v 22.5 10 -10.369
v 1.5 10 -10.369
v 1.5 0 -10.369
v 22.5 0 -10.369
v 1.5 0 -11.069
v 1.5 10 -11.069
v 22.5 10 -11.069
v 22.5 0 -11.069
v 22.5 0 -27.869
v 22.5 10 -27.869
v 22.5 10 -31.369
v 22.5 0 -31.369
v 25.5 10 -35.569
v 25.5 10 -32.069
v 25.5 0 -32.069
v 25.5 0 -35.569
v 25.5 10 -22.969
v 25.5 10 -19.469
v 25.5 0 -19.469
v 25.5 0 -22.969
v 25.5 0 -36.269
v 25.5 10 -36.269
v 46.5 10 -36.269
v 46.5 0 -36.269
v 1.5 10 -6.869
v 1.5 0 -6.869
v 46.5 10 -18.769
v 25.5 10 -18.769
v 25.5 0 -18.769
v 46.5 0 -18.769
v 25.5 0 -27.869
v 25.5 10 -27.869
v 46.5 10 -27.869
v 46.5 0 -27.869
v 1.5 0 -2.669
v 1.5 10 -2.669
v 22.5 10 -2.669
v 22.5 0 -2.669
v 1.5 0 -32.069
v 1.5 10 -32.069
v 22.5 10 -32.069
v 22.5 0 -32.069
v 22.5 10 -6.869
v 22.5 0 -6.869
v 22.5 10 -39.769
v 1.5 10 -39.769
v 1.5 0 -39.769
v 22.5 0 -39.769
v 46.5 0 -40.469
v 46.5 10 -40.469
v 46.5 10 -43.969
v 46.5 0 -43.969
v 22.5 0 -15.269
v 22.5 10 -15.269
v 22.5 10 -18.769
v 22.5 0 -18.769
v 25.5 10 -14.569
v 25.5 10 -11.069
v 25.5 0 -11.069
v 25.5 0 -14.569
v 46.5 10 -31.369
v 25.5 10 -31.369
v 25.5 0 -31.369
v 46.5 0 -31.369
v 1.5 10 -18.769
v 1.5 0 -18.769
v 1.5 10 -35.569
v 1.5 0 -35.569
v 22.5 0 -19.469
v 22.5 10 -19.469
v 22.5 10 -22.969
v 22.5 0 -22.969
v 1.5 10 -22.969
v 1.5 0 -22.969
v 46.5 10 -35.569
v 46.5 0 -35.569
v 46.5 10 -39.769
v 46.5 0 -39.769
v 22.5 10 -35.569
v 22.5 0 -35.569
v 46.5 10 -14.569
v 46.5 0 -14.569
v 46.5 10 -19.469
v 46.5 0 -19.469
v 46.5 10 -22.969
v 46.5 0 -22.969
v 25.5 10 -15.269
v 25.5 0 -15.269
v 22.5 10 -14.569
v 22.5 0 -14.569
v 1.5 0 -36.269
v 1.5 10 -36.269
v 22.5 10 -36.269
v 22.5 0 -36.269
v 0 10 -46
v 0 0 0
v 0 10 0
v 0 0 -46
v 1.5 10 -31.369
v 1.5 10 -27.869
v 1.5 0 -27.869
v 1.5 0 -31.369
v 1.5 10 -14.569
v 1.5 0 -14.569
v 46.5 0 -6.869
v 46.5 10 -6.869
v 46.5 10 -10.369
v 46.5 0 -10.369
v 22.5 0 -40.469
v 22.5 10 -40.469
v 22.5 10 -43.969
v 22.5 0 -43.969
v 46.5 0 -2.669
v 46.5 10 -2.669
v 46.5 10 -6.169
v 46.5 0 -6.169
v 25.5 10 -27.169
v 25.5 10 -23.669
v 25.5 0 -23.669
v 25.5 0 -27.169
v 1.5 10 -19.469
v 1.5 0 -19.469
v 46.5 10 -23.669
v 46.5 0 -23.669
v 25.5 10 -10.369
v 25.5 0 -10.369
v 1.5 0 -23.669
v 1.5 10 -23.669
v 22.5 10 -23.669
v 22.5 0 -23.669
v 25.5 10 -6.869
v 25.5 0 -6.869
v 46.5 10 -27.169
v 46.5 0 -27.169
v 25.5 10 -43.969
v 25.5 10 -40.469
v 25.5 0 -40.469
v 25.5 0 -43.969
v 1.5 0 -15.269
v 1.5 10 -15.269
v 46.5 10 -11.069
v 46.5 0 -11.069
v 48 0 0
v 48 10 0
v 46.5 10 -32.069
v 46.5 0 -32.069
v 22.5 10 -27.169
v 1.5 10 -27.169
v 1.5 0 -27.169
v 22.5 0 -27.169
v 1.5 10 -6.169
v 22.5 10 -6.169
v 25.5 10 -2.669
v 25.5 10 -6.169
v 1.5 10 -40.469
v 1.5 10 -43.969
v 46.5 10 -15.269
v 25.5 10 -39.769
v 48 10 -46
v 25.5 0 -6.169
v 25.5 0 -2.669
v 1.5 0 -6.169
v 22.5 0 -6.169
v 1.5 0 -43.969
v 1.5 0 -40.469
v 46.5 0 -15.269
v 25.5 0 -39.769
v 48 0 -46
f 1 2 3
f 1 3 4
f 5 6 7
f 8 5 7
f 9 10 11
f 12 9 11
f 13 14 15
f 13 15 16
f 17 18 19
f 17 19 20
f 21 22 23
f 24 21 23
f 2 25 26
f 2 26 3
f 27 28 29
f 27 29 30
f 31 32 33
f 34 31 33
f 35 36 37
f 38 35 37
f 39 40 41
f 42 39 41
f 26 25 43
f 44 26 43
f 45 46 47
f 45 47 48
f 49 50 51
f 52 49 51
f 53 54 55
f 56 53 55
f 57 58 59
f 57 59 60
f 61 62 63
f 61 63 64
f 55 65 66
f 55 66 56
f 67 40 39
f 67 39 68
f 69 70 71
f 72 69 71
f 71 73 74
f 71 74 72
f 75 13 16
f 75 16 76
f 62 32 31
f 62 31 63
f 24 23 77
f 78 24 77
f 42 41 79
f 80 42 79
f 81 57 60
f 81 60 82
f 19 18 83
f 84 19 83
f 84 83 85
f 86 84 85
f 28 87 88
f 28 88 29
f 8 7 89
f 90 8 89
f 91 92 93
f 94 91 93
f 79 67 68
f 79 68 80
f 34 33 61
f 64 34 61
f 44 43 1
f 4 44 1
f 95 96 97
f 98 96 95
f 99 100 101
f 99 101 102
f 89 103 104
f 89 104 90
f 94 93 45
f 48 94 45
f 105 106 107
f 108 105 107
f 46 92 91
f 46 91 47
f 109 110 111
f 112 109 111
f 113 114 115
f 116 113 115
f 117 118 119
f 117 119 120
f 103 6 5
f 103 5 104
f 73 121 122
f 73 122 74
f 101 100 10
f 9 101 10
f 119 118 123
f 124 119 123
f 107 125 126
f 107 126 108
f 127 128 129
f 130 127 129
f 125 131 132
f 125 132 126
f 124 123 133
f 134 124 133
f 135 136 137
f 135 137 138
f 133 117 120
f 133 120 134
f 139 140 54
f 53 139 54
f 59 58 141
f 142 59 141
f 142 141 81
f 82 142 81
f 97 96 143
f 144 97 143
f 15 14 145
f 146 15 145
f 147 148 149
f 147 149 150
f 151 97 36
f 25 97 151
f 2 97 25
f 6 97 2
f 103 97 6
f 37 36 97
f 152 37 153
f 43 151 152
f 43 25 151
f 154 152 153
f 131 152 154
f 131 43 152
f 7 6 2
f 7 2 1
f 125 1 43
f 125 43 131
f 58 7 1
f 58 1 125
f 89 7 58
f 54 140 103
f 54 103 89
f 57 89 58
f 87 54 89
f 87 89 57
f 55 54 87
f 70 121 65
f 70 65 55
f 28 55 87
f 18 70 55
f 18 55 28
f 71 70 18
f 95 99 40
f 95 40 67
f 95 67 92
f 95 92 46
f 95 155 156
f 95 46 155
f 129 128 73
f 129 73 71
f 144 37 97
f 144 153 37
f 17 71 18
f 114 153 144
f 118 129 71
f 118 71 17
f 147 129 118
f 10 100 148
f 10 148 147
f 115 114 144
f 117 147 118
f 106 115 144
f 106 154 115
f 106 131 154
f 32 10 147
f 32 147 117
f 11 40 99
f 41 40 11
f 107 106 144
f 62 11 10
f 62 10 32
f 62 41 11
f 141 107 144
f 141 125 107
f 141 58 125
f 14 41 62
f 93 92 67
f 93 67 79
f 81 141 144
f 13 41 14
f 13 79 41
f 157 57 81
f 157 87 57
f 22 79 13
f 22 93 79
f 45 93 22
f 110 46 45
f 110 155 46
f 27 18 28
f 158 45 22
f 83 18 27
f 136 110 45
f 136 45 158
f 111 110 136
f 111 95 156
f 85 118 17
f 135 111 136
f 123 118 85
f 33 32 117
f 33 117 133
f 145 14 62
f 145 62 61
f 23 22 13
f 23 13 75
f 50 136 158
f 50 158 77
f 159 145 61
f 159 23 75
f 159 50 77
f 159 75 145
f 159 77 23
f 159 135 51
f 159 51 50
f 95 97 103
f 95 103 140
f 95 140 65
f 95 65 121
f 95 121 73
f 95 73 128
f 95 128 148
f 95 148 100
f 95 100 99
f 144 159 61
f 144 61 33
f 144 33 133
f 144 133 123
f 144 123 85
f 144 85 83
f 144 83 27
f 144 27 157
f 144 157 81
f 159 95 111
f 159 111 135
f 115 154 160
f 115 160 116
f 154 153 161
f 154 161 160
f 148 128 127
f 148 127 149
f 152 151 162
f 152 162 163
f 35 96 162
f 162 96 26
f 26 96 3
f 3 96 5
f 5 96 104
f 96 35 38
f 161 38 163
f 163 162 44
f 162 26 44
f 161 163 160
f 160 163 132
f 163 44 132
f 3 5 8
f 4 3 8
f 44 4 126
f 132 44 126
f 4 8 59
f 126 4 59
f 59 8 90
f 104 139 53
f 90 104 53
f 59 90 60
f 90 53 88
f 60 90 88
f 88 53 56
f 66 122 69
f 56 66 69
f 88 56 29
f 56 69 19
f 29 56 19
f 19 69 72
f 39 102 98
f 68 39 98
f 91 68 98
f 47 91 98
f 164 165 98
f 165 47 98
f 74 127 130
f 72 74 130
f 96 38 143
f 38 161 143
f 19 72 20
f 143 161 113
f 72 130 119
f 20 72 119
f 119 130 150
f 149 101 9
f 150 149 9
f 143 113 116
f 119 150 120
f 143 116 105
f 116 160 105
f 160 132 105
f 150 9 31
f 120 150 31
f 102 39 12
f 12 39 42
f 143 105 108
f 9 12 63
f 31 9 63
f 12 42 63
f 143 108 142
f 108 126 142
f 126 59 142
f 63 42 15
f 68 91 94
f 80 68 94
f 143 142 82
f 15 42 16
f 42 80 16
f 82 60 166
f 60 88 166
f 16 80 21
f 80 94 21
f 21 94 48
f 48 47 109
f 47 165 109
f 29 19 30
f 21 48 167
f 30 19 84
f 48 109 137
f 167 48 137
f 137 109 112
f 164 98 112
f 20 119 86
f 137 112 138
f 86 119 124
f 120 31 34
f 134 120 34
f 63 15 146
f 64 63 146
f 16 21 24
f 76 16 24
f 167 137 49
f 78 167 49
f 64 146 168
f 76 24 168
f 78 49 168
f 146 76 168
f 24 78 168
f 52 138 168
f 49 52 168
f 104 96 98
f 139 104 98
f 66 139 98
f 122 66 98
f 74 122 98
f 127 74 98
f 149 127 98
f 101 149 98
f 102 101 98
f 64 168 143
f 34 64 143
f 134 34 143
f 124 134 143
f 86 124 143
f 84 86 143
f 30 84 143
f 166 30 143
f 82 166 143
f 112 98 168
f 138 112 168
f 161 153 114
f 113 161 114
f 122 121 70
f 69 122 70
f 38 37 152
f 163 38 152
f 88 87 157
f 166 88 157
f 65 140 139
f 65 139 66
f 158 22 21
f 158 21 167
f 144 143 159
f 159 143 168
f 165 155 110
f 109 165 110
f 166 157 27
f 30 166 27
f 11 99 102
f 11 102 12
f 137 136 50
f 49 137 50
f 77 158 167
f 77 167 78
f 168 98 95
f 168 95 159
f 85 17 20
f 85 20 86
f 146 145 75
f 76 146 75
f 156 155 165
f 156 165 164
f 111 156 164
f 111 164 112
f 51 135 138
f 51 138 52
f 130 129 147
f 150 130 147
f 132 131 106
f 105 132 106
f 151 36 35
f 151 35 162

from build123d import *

# Parameters (mm, degrees)
ESQUISSE1_W             = 48
ESQUISSE1_H             = 46
BOSS_EXTRU_1_DEPTH      = 10
ESQUISSE3_W             = 21
ESQUISSE3_H             = 3.5
ENL_V_MAT_EXTRU_1_DEPTH = 10


with BuildPart() as part:
    # Esquisse1 → Boss.-Extru.1 (new body)
    with BuildSketch(Plane(origin=(0, 0, 0), x_dir=(1, 0, 0), z_dir=(0, 1, 0))):
        with Locations((24, 23)):
            Rectangle(ESQUISSE1_W, ESQUISSE1_H)
    extrude(amount=BOSS_EXTRU_1_DEPTH)

    # Esquisse3 → Enlèv. mat.-Extru.1 (cut)
    with BuildSketch(Plane(origin=(0, 10, 0), x_dir=(1, 0, 0), z_dir=(0, 1, 0))):
        with Locations((36, 4.419258555)):
            Rectangle(ESQUISSE3_W, ESQUISSE3_H)
        with Locations((36, 8.619258555)):
            Rectangle(ESQUISSE3_W, ESQUISSE3_H)
        with Locations((36, 12.819258555)):
            Rectangle(ESQUISSE3_W, ESQUISSE3_H)
        with Locations((36, 17.019258555)):
            Rectangle(ESQUISSE3_W, ESQUISSE3_H)
        with Locations((36, 21.219258555)):
            Rectangle(ESQUISSE3_W, ESQUISSE3_H)
        with Locations((36, 25.419258555)):
            Rectangle(ESQUISSE3_W, ESQUISSE3_H)
        with Locations((36, 29.619258555)):
            Rectangle(ESQUISSE3_W, ESQUISSE3_H)
        with Locations((36, 33.819258555)):
            Rectangle(ESQUISSE3_W, ESQUISSE3_H)
        with Locations((36, 38.019258555)):
            Rectangle(ESQUISSE3_W, ESQUISSE3_H)
        with Locations((36, 42.219258555)):
            Rectangle(ESQUISSE3_W, ESQUISSE3_H)
        with Locations((12, 4.419258555)):
            Rectangle(ESQUISSE3_W, ESQUISSE3_H)
        with Locations((12, 8.619258555)):
            Rectangle(ESQUISSE3_W, ESQUISSE3_H)
        with Locations((12, 12.819258555)):
            Rectangle(ESQUISSE3_W, ESQUISSE3_H)
        with Locations((12, 17.019258555)):
            Rectangle(ESQUISSE3_W, ESQUISSE3_H)
        with Locations((12, 21.219258555)):
            Rectangle(ESQUISSE3_W, ESQUISSE3_H)
        with Locations((12, 25.419258555)):
            Rectangle(ESQUISSE3_W, ESQUISSE3_H)
        with Locations((12, 29.619258555)):
            Rectangle(ESQUISSE3_W, ESQUISSE3_H)
        with Locations((12, 33.819258555)):
            Rectangle(ESQUISSE3_W, ESQUISSE3_H)
        with Locations((12, 38.019258555)):
            Rectangle(ESQUISSE3_W, ESQUISSE3_H)
        with Locations((12, 42.219258555)):
            Rectangle(ESQUISSE3_W, ESQUISSE3_H)
    extrude(amount=-ENL_V_MAT_EXTRU_1_DEPTH, mode=Mode.SUBTRACT)


solid = part.part
